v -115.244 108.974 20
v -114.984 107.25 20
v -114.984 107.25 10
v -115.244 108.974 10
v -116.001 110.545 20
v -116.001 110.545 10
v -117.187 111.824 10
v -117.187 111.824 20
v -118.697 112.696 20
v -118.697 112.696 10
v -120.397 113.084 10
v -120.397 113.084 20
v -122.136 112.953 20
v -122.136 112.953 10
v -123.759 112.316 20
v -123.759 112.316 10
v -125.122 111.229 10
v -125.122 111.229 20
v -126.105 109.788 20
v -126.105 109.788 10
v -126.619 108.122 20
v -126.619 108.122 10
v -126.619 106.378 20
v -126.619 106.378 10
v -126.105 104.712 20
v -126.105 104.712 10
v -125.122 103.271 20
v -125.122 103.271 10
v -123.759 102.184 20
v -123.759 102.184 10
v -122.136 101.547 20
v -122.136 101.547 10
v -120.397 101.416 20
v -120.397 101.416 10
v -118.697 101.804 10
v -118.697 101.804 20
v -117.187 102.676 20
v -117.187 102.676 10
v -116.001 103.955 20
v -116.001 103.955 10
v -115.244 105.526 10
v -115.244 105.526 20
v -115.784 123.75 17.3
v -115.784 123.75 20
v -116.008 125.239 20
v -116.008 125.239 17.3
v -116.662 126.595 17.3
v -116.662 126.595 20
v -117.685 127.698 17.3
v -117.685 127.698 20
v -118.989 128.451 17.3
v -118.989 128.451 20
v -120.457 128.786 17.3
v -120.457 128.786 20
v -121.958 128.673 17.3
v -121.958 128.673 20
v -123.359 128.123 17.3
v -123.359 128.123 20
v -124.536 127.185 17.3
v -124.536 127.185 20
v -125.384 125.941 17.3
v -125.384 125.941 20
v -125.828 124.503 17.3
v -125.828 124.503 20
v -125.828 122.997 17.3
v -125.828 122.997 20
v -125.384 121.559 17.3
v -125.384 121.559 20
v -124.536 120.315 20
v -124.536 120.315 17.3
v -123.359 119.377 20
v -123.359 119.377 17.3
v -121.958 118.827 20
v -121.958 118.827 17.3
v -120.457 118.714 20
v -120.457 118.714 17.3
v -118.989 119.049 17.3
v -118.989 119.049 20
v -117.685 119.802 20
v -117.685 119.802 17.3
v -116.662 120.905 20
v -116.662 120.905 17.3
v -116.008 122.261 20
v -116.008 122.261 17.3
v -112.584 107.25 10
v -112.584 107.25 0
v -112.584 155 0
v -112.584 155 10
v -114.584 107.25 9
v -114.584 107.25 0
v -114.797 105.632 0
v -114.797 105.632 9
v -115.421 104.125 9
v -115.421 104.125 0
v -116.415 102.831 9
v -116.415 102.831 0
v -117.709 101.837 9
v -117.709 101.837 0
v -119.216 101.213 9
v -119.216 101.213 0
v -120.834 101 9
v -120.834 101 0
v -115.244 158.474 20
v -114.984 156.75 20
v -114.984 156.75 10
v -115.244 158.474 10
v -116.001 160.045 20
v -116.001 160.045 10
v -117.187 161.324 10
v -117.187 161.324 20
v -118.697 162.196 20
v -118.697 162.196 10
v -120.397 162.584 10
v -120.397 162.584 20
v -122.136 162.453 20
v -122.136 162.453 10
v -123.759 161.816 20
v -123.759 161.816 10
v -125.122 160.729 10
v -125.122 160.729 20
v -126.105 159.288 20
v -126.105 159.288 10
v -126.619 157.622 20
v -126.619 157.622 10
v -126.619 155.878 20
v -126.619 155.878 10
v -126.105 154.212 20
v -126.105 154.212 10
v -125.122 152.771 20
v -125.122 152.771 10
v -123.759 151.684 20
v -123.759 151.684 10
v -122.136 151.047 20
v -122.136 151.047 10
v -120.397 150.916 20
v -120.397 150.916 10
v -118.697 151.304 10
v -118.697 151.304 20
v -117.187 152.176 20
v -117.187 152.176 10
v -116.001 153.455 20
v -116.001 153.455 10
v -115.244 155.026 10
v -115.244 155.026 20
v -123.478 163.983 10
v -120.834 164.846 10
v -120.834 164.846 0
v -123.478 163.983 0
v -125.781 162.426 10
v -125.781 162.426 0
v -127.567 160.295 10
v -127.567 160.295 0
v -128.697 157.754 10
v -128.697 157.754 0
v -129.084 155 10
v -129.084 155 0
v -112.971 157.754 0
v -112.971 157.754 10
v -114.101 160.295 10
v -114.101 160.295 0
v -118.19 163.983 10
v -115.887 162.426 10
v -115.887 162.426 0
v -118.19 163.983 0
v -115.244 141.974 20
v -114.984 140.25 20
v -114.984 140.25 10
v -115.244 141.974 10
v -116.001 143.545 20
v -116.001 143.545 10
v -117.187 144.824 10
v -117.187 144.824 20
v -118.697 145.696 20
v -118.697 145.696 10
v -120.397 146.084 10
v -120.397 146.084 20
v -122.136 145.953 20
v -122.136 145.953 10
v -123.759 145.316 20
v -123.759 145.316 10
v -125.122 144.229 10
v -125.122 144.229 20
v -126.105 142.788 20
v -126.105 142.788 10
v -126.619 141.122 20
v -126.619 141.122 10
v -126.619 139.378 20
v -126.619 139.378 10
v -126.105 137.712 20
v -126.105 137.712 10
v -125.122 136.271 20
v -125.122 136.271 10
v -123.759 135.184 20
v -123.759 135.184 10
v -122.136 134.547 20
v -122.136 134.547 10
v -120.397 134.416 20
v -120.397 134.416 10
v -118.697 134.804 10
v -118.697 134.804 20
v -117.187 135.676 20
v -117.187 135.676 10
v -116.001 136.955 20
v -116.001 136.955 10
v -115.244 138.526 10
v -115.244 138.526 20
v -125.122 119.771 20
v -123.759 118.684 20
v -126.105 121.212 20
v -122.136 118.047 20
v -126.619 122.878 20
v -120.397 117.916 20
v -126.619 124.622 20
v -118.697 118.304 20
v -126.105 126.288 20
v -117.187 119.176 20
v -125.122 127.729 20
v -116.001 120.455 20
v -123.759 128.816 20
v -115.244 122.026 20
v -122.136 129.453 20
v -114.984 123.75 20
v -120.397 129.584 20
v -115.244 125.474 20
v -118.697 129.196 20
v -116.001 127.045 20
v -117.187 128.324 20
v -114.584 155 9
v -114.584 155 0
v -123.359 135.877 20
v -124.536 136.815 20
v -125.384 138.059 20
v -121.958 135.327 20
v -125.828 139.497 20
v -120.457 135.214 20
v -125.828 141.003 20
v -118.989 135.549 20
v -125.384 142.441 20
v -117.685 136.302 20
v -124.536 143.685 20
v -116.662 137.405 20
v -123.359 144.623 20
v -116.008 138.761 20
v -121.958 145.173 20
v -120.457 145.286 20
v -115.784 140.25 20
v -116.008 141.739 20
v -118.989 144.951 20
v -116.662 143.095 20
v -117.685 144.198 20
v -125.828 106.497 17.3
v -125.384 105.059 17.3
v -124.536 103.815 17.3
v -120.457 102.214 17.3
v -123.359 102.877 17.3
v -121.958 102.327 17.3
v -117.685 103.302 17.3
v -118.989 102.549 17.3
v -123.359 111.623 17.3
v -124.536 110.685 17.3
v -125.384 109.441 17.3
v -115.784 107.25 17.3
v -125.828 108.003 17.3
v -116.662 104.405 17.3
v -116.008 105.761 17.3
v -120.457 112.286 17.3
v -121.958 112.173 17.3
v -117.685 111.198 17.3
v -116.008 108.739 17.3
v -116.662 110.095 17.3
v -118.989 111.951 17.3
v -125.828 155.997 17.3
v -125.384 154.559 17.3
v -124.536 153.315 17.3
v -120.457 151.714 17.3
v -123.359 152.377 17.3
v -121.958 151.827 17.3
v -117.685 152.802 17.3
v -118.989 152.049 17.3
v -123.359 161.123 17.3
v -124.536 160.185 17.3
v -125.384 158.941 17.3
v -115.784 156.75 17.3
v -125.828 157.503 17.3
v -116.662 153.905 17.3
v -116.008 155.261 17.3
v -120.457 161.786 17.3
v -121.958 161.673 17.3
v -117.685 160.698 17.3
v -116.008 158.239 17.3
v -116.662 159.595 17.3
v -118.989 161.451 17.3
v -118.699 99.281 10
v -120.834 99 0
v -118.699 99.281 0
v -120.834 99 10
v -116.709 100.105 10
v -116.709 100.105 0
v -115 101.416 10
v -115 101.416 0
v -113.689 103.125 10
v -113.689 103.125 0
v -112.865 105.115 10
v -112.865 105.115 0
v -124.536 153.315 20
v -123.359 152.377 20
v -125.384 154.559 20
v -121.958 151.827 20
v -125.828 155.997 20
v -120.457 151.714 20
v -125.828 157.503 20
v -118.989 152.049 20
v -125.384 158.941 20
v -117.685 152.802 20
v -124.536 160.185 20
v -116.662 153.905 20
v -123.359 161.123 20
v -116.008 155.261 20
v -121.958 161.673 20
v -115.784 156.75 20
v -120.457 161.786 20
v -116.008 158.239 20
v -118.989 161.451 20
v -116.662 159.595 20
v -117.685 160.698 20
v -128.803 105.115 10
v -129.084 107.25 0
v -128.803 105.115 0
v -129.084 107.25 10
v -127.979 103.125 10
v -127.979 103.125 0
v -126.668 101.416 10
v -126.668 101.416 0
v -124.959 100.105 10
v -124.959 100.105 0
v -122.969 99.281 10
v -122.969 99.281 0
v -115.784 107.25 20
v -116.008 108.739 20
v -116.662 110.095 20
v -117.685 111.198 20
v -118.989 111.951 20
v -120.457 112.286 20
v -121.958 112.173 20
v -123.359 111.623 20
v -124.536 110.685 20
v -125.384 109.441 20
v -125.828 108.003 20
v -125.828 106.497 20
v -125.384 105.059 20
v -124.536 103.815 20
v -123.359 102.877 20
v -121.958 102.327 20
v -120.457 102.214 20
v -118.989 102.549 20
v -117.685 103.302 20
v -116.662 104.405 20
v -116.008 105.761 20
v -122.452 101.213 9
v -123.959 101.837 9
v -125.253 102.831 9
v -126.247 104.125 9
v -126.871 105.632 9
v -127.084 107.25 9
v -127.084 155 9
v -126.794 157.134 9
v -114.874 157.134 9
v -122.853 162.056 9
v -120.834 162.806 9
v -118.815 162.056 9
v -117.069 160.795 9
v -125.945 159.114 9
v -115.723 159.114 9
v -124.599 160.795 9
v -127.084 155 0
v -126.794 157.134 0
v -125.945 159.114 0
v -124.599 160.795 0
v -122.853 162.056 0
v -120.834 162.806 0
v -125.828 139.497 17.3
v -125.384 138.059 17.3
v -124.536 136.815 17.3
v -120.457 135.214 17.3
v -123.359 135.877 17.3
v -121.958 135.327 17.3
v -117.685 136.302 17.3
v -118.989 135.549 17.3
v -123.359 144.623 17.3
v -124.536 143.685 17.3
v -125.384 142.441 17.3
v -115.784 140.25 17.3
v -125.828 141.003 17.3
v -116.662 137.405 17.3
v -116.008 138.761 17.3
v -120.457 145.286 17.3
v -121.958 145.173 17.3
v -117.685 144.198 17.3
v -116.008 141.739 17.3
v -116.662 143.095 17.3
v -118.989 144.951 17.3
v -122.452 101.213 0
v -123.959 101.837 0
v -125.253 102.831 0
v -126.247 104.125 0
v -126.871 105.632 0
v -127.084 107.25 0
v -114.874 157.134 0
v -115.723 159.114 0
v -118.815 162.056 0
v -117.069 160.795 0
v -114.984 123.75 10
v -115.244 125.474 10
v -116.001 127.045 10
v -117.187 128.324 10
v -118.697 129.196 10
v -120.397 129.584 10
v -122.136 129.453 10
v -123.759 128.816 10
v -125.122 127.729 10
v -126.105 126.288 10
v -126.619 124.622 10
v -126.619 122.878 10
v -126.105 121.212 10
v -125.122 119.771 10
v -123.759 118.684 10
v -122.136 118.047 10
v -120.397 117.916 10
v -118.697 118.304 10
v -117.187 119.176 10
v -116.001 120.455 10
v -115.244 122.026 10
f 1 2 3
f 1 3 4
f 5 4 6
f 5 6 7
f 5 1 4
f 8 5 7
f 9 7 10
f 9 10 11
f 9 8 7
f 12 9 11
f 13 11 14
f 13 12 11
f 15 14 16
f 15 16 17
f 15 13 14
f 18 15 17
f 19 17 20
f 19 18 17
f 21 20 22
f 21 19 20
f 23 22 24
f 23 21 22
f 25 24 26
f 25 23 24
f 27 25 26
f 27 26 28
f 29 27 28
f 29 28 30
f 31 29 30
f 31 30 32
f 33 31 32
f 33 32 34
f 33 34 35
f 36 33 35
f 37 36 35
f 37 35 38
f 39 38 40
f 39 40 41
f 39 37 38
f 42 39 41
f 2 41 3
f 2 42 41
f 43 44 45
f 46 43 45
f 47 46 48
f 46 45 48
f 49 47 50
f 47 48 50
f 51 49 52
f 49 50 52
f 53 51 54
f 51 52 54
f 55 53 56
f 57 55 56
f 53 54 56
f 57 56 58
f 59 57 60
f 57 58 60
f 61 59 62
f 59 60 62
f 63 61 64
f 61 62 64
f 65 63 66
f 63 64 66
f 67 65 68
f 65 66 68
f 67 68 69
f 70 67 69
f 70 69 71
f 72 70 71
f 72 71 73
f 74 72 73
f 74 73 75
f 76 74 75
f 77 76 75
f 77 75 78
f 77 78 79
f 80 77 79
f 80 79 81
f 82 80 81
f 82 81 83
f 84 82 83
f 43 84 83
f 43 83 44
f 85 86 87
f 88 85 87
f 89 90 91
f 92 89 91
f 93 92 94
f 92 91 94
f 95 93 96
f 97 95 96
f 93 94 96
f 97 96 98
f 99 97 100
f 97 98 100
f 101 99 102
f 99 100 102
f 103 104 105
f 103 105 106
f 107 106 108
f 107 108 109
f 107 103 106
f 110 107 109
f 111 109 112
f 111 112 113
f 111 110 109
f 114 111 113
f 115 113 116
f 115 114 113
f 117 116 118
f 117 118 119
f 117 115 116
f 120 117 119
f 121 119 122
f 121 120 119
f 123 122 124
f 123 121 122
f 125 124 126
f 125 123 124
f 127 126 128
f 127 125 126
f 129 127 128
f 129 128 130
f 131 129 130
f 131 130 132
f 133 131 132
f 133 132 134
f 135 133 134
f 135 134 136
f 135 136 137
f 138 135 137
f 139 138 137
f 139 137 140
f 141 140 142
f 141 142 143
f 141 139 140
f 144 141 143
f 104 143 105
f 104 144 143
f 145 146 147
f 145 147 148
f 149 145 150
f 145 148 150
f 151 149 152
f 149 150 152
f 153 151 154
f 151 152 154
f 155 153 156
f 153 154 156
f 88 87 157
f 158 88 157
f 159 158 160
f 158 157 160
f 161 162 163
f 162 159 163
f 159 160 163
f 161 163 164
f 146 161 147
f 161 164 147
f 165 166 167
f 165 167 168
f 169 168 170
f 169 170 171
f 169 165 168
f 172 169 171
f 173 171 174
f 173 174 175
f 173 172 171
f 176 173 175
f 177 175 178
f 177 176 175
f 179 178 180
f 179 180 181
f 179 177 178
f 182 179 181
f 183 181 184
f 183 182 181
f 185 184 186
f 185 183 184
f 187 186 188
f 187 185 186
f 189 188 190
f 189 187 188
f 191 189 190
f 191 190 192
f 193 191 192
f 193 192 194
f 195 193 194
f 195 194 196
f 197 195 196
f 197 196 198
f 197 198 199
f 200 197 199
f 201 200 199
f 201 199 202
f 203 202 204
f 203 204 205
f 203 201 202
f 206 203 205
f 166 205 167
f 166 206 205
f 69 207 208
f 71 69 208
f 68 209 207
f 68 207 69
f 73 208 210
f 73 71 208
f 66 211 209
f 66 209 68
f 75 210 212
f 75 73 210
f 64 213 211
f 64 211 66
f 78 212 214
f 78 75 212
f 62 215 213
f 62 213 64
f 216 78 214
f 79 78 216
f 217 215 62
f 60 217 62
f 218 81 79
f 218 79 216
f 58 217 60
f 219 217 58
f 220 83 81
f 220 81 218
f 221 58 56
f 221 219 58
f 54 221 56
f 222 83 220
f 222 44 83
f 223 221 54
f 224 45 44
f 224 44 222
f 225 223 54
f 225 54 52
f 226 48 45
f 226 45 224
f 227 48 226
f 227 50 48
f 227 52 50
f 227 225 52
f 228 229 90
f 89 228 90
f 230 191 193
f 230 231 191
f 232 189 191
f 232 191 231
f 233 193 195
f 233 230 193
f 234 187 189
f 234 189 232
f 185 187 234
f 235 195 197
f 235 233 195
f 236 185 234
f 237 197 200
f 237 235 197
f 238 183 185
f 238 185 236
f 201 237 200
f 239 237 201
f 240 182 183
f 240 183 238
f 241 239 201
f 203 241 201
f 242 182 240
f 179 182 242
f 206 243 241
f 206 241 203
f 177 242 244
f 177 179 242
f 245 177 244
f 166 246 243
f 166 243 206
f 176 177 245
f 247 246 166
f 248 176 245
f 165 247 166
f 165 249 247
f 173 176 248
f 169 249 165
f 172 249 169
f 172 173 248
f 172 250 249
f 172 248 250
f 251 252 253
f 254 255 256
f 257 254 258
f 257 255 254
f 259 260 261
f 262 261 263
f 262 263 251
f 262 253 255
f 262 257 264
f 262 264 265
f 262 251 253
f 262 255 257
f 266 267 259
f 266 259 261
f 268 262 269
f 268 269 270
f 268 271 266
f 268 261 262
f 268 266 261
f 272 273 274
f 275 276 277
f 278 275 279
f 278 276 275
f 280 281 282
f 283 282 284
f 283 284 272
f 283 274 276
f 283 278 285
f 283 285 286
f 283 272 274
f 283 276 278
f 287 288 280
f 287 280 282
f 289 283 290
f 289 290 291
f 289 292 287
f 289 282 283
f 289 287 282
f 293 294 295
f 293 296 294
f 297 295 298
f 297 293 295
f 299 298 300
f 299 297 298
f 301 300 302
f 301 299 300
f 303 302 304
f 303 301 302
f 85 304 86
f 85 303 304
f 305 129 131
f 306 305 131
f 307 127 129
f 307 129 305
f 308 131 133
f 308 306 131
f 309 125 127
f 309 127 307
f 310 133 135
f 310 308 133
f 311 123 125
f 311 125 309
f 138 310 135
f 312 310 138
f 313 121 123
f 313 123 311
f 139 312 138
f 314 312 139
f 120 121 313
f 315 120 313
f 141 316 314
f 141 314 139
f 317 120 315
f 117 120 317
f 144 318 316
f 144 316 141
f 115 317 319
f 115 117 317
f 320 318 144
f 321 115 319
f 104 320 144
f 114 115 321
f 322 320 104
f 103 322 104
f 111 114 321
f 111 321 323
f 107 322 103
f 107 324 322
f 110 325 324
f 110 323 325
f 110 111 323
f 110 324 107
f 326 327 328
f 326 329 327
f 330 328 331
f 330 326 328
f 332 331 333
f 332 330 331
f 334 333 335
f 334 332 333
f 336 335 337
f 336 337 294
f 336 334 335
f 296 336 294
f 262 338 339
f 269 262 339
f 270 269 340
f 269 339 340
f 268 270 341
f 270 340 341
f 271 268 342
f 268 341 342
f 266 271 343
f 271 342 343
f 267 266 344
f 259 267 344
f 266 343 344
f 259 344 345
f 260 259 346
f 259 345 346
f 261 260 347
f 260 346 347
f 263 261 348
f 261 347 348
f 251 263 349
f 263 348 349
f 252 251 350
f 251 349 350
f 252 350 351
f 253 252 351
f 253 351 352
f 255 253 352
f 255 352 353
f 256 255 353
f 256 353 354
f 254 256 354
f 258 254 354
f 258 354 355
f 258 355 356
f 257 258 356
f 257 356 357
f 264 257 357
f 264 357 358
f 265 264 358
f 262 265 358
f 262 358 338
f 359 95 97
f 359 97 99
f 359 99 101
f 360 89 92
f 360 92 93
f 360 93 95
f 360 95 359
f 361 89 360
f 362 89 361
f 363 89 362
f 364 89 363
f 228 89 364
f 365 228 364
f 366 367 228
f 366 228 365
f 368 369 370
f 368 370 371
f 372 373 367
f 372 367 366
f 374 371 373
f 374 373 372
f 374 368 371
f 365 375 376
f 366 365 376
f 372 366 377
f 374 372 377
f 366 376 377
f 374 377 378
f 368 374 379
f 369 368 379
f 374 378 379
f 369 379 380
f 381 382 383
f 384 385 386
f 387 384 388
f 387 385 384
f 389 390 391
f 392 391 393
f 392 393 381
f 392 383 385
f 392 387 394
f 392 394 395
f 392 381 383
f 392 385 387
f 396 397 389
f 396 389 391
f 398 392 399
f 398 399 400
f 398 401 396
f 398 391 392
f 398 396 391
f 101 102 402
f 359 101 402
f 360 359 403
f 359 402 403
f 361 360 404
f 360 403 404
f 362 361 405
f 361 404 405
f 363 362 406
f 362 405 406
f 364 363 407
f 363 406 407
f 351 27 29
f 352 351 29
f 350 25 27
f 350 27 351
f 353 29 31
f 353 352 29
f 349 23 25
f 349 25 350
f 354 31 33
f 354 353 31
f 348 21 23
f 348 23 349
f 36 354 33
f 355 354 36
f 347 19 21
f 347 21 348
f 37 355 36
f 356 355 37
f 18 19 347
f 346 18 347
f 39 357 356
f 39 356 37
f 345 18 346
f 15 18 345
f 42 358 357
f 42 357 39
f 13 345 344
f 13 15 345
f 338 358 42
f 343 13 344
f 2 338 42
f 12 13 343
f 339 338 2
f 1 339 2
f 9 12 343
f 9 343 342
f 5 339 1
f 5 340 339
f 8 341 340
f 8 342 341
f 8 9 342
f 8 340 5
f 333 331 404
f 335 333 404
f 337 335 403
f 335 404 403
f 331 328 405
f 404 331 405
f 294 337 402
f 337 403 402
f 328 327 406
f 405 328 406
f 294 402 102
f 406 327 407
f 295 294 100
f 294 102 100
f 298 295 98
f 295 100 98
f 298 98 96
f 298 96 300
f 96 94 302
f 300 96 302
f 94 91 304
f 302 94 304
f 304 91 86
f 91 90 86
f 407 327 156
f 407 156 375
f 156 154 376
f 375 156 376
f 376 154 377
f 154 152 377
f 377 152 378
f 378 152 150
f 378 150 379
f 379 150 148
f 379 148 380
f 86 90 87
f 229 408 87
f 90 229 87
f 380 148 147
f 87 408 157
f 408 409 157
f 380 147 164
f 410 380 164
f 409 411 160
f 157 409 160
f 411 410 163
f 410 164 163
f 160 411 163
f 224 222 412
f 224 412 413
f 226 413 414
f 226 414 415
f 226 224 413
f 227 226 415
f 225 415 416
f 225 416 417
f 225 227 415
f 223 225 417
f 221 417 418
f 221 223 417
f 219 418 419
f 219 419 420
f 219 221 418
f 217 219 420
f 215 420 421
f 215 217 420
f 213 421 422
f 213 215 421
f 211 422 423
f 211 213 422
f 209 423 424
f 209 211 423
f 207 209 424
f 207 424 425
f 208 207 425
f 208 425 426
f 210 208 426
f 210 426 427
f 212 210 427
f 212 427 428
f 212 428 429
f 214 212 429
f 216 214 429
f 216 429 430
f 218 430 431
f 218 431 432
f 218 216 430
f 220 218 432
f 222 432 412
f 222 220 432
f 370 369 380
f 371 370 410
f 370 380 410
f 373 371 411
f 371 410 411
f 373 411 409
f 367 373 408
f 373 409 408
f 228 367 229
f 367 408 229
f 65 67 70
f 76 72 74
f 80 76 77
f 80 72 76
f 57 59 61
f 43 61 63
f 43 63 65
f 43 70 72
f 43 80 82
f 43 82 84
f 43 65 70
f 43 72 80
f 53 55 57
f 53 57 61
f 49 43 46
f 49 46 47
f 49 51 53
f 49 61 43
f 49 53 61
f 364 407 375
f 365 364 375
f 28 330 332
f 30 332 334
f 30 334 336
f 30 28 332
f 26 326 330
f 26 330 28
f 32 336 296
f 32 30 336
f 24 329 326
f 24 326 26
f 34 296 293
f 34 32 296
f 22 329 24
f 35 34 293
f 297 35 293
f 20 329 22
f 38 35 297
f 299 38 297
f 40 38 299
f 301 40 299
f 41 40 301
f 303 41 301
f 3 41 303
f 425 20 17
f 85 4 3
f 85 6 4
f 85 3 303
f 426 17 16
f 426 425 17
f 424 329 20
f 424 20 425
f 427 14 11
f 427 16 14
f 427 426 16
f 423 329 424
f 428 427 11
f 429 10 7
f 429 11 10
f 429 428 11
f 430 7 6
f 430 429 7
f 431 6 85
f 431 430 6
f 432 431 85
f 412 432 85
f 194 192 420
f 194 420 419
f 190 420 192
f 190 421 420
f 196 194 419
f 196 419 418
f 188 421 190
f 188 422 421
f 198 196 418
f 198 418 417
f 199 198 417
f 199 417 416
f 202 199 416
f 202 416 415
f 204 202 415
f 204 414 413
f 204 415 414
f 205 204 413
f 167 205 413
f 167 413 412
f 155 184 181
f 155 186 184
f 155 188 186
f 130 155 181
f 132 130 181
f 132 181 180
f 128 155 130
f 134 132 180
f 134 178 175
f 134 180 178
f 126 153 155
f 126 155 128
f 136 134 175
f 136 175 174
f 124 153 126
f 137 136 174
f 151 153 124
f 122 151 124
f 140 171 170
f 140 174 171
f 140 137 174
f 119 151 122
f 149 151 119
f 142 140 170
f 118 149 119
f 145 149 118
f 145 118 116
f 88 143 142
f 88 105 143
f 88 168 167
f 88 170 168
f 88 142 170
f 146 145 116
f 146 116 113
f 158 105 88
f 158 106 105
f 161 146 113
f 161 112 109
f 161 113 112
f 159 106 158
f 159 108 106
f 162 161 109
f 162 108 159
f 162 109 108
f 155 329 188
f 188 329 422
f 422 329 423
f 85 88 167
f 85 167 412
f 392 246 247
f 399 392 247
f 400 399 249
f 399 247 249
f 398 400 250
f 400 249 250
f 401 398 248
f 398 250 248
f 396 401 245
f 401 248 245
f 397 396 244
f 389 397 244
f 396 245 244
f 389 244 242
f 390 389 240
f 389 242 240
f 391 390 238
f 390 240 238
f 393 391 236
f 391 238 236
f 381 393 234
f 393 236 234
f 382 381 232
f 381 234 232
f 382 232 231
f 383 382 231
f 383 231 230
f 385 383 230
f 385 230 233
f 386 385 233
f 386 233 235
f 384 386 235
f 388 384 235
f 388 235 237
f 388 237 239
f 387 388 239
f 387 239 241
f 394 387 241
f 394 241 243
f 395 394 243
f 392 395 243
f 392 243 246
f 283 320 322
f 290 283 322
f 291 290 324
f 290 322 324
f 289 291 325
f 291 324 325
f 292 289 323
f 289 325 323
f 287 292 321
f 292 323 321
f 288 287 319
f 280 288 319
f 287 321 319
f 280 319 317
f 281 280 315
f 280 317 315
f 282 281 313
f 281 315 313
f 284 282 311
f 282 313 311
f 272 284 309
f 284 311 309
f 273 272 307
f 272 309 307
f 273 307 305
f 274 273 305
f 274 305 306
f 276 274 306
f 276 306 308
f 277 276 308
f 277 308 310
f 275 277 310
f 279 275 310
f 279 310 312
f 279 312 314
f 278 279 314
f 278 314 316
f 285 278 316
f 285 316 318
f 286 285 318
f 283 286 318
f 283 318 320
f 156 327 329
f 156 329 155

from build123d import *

# Parameters (mm, degrees)
SKETCH1_W                       = 16.5
SKETCH1_H                       = 66
BOSS_EXTRUDE1_DEPTH             = 20
SKETCH2_W                       = 16.5
SKETCH2_H                       = 33
SKETCH2_R                       = 5.85
SKETCH2_R_2                     = 5.05
CUT_EXTRUDE1_DEPTH              = 10
FILLET1_R                       = 10
FILLET2_R                       = 8.25
SKIZZE1_R                       = 5.1
AUFSATZ_LINEAR_AUSTRAGEN1_DEPTH = 7.3
SCHNITT_LINEAR_AUSTRAGEN1_DEPTH = 9


# Some blends are built 0.0001 mm under size
with BuildPart() as part:
    # Sketch1 → Boss-Extrude1 (new body)
    with BuildSketch(Plane.XY):
        with Locations((-120.834022786, 132)):
            Rectangle(SKETCH1_W, SKETCH1_H)
    extrude(amount=BOSS_EXTRUDE1_DEPTH)

    # Sketch2 → Cut-Extrude1 (cut)
    # profile 1 of 6: a face of its own
    with BuildSketch(Plane.XY.offset(20)):
        with Locations((-120.834022786, 115.5)):
            Rectangle(SKETCH2_W, SKETCH2_H)
        with Locations((-120.834022786, 107.25)):
            Circle(SKETCH2_R, mode=Mode.SUBTRACT)
        with Locations((-120.834022786, 123.75)):
            Circle(SKETCH2_R, mode=Mode.SUBTRACT)
    # profile 2 of 6: a face of its own
    with BuildSketch(Plane.XY.offset(20)):
        with Locations((-120.834022786, 148.5)):
            Rectangle(SKETCH2_W, SKETCH2_H)
        with Locations((-120.834022786, 140.25)):
            Circle(SKETCH2_R, mode=Mode.SUBTRACT)
        with Locations((-120.834022786, 156.75)):
            Circle(SKETCH2_R, mode=Mode.SUBTRACT)
    # profile 3 of 6: a face of its own
    with BuildSketch(Plane.XY.offset(20)):
        with Locations((-120.834022786, 140.25)):
            Circle(SKETCH2_R_2)
    # profile 4 of 6: a face of its own
    with BuildSketch(Plane.XY.offset(20)):
        with Locations((-120.834022786, 123.75)):
            Circle(SKETCH2_R_2)
    # profile 5 of 6: a face of its own
    with BuildSketch(Plane.XY.offset(20)):
        with Locations((-120.834022786, 107.25)):
            Circle(SKETCH2_R_2)
    # profile 6 of 6: a face of its own
    with BuildSketch(Plane.XY.offset(20)):
        with Locations((-120.834022786, 156.75)):
            Circle(SKETCH2_R_2)
    extrude(amount=-CUT_EXTRUDE1_DEPTH, mode=Mode.SUBTRACT)

    # Fillet1
    # the kernel refuses this fillet: 10 mm, written as the material it takes off along each edge
    with BuildSketch(Plane(origin=(-129.084022786, 165, -25), x_dir=(1, 0, 0), z_dir=(0, 0, 1))) as fillet1_piece_1:
        with BuildLine():
            CenterArc((FILLET1_R, -FILLET1_R), FILLET1_R, 90, 90)
            Line((0, -FILLET1_R), (0, 0))
            Line((0, 0), (FILLET1_R, 0))
        make_face()
    extrude(amount=60, mode=Mode.SUBTRACT)
    with BuildSketch(Plane(origin=(-112.584022786, 165, -25), x_dir=(-1, 0, 0), z_dir=(0, 0, 1))) as fillet1_piece_2:
        with BuildLine():
            CenterArc((FILLET1_R, FILLET1_R), FILLET1_R, 180, 90)
            Line((0, FILLET1_R), (0, 0))
            Line((0, 0), (FILLET1_R, 0))
        make_face()
    extrude(amount=60, mode=Mode.SUBTRACT)

    # Fillet2
    fillet2_edges = [part.edges().sort_by_distance(p)[0] for p in [
        (-129.084022786, 99, 5),
        (-112.584022786, 99, 5),
    ]]
    fillet(fillet2_edges, radius=FILLET2_R - 0.0001)  # a hair under: the kernel refuses the full size

    # Skizze1 → Aufsatz-Linear austragen1 (add)
    with BuildSketch(Plane.XY.offset(10)):
        with Locations((-120.834022786, 156.75)):
            Circle(SKIZZE1_R)
        with Locations((-120.834022786, 140.25)):
            Circle(SKIZZE1_R)
        with Locations((-120.834022786, 123.75)):
            Circle(SKIZZE1_R)
        with Locations((-120.834022786, 107.25)):
            Circle(SKIZZE1_R)
    extrude(amount=AUFSATZ_LINEAR_AUSTRAGEN1_DEPTH)

    # Skizze2 → Schnitt-Linear austragen1 (cut)
    with BuildSketch(Plane(origin=(0, 0, 0), x_dir=(-1, 0, 0), z_dir=(0, 0, -1))):
        with BuildLine():
            Line((127.084022786, 107.25), (127.084022786, 155))
            ThreePointArc((127.084022786, 155), (125.329020784, 160), (120.834022786, 162.806247498))
            ThreePointArc((120.834022786, 162.806247498), (116.339024787, 160), (114.584022786, 155))
            Line((114.584022786, 155), (114.584022786, 107.25))
            ThreePointArc((114.584022786, 107.25), (116.414605403, 102.830582618), (120.834022786, 101))
            ThreePointArc((120.834022786, 101), (125.253440168, 102.830582618), (127.084022786, 107.25))
        make_face()
    extrude(amount=-SCHNITT_LINEAR_AUSTRAGEN1_DEPTH, mode=Mode.SUBTRACT)


solid = part.part
